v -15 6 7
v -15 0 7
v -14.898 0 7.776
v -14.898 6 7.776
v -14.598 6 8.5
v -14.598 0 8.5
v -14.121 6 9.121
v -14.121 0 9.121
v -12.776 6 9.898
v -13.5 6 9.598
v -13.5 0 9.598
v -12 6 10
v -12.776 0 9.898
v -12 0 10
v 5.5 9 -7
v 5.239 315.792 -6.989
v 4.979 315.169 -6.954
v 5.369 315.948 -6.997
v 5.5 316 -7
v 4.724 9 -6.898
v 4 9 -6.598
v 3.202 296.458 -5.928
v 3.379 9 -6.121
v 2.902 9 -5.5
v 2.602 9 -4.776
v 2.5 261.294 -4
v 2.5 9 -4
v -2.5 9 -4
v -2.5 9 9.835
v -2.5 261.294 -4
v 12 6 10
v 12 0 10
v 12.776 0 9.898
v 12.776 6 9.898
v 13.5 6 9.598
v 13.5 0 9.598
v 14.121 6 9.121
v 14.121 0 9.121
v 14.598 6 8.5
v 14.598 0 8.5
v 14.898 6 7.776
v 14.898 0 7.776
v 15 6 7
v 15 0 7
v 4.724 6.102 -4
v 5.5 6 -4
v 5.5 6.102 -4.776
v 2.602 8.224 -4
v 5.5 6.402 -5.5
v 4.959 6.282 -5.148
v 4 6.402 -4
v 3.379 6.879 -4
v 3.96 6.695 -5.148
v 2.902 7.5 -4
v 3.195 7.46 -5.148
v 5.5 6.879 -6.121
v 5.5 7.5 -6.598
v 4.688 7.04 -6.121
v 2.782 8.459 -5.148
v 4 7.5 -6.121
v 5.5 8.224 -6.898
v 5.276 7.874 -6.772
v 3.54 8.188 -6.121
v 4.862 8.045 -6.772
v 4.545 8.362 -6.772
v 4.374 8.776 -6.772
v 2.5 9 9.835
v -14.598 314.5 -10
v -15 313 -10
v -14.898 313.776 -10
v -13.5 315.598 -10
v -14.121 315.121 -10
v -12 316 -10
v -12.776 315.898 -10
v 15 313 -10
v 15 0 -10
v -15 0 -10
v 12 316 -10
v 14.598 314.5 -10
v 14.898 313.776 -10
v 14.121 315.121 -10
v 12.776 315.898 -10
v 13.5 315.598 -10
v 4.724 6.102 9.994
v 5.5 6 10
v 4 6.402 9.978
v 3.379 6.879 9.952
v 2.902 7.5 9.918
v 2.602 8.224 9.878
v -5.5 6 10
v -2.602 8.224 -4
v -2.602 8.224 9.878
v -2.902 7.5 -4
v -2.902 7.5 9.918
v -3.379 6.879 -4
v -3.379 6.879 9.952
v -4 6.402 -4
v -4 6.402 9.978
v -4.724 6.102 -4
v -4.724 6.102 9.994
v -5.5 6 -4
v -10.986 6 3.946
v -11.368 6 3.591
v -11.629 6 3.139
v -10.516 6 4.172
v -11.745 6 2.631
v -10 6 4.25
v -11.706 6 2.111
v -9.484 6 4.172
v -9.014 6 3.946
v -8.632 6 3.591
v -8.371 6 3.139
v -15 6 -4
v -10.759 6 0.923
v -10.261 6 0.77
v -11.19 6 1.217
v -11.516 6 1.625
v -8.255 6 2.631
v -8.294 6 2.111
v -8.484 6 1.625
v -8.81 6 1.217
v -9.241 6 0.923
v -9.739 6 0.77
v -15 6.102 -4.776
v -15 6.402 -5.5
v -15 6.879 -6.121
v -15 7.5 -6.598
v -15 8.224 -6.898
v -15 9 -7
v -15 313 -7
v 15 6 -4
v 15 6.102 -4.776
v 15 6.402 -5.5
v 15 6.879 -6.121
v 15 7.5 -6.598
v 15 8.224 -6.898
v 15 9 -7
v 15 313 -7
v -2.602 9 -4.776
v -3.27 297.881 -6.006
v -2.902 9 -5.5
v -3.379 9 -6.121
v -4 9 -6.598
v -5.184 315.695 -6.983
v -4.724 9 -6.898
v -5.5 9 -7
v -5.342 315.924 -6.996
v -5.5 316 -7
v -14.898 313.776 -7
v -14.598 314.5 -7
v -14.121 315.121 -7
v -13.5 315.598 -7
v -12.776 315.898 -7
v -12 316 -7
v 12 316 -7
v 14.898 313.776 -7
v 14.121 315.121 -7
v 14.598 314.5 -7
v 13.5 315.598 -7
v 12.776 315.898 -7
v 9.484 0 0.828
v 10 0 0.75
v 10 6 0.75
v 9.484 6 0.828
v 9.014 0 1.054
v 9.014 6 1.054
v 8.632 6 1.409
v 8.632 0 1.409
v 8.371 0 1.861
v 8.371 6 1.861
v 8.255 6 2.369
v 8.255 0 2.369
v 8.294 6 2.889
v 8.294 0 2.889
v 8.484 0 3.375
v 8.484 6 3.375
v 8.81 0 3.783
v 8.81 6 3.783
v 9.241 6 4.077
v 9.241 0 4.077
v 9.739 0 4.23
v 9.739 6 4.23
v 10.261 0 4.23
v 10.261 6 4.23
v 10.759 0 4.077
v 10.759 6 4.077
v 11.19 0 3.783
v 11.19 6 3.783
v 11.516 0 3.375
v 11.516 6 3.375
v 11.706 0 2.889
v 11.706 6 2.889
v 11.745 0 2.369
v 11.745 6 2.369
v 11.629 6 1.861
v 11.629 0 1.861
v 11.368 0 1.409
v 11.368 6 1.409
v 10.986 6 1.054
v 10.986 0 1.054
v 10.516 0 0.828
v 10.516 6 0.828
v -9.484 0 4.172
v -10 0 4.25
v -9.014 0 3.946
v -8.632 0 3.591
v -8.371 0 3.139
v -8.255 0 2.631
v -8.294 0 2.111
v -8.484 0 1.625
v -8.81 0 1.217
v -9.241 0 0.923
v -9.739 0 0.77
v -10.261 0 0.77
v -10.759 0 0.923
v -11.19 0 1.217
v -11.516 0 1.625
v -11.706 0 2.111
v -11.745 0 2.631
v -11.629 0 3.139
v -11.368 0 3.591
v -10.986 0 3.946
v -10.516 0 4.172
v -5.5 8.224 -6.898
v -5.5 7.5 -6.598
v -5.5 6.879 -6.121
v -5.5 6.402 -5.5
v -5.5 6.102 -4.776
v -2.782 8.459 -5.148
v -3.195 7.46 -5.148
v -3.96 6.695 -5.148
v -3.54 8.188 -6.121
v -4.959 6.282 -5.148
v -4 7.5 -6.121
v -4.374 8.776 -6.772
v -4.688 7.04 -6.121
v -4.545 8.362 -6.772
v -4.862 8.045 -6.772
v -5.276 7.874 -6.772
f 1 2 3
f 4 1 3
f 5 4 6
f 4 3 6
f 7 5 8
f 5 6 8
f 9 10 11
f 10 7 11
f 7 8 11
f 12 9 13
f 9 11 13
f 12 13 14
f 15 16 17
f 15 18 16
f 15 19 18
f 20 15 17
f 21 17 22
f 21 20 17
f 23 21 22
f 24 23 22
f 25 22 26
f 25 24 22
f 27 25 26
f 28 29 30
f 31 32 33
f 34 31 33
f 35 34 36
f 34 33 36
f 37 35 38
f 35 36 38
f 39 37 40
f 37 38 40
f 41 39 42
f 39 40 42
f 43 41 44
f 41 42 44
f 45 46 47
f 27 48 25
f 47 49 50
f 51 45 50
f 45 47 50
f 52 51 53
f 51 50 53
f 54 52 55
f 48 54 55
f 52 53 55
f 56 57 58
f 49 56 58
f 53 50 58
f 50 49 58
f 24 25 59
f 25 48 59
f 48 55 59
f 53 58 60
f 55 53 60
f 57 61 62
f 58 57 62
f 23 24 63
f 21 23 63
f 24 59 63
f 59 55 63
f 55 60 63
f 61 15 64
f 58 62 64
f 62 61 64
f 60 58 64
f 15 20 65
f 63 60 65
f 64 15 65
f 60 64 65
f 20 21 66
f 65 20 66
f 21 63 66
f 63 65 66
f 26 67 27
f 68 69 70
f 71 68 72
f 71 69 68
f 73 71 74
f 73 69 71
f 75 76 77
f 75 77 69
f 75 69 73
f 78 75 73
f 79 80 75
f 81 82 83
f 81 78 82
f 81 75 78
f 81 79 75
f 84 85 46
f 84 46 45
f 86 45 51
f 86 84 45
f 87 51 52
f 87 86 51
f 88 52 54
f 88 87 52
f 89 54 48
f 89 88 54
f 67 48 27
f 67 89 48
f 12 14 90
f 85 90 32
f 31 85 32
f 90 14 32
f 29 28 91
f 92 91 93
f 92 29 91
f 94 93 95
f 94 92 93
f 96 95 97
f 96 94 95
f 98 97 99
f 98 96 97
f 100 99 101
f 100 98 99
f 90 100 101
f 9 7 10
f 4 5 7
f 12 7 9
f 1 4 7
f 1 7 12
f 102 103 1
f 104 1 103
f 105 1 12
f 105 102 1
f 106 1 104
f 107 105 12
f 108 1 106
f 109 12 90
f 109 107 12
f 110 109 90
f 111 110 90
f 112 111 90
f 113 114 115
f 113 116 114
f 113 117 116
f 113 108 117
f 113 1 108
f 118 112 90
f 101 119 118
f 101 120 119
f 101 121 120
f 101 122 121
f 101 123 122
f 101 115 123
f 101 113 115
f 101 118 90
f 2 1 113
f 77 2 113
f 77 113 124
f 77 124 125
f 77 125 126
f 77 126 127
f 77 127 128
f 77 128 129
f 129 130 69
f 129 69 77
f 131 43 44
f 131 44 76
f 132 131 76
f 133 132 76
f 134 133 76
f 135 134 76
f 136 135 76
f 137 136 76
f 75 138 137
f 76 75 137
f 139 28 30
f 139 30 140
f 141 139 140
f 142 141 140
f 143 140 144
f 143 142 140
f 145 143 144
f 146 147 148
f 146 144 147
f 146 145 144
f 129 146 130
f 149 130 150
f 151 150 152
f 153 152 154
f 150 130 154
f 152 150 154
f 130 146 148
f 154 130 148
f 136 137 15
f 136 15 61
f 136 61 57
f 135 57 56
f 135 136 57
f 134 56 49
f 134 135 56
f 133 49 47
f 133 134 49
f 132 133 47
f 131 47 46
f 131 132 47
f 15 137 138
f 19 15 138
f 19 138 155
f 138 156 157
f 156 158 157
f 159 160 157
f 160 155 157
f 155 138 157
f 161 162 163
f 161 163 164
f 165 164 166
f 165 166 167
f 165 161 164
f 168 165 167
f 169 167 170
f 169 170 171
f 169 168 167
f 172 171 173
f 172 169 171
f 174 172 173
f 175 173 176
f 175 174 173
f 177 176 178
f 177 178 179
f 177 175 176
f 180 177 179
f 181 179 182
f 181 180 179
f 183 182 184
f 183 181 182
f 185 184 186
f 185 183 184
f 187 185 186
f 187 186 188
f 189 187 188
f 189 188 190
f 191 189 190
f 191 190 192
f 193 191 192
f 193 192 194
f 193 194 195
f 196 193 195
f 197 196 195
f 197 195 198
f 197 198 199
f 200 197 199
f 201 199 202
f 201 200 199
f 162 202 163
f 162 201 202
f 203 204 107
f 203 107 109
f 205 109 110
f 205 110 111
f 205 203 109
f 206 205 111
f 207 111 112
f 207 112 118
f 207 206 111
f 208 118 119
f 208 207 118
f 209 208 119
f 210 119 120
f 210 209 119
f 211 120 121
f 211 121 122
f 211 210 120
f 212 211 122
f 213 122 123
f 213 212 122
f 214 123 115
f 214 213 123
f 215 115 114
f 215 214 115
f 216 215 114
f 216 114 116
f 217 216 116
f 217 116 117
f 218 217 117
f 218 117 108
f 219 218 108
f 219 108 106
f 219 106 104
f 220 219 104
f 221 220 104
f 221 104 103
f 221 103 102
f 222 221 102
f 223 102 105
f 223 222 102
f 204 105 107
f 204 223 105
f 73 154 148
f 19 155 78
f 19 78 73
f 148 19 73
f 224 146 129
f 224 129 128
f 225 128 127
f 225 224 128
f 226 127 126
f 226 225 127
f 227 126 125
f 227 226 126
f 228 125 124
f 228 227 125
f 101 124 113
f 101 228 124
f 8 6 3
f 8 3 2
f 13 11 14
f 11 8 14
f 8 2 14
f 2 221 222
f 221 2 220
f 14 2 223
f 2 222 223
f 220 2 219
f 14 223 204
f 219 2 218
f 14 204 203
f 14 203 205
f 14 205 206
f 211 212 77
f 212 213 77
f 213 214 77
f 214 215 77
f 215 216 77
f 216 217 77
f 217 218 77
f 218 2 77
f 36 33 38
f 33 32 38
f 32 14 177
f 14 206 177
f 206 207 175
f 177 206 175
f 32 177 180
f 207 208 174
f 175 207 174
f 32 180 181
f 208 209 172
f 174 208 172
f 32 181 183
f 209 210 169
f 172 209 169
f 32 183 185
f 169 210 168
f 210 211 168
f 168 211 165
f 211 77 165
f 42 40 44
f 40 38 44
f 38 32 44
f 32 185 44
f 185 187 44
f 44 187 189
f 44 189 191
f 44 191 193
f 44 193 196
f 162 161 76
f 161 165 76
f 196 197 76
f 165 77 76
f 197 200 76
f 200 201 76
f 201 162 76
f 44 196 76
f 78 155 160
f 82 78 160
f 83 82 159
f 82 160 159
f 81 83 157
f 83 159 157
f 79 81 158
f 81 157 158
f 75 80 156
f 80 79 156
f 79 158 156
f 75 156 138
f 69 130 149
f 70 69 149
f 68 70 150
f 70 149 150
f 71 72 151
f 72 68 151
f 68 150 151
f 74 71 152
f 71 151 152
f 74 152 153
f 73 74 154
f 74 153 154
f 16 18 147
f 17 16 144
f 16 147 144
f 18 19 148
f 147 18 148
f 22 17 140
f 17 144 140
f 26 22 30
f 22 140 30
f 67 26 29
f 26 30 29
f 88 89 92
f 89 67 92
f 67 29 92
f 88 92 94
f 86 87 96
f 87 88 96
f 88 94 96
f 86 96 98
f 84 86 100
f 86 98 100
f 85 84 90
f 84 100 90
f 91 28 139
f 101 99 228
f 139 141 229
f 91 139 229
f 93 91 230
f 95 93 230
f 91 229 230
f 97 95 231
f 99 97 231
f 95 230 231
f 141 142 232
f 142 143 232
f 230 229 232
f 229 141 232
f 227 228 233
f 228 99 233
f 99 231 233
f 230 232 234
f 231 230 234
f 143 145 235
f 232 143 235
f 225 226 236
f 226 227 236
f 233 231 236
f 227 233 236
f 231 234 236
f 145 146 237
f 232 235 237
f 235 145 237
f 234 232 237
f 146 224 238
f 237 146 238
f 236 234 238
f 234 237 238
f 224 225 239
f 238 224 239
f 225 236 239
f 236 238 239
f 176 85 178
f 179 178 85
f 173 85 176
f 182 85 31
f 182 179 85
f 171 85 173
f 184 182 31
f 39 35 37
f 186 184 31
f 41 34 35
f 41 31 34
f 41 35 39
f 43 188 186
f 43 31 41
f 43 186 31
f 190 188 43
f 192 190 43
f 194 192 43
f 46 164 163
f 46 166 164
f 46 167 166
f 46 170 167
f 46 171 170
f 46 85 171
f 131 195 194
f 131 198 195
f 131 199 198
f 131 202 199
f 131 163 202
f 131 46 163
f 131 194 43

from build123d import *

# Parameters (mm, degrees)
SKETCH_1_W      = 30
SKETCH_1_H      = 20
SKETCH_1_R      = 1.75
EXTRUDE_1_DEPTH = 6
SKETCH_2_W      = 3
SKETCH_2_H      = 310
EXTRUDE_2_DEPTH = 30
EXTRUDE_3_DEPTH = 2.5
FILLET_1_R      = 3


with BuildPart() as part:
    # 草图1 → 凸台-拉伸1 (new body)
    with BuildSketch(Plane(origin=(0, 0, 0), x_dir=(1, 0, 0), z_dir=(0, 1, 0))):
        Rectangle(SKETCH_1_W, SKETCH_1_H)
        with Locations(Location((-10, -2.5, 0), (0, 0, 270))):
            Circle(SKETCH_1_R, mode=Mode.SUBTRACT)
        with Locations(Location((10, -2.5, 0), (0, 0, 90))):
            Circle(SKETCH_1_R, mode=Mode.SUBTRACT)
    extrude(amount=EXTRUDE_1_DEPTH)

    # 草图2 → 凸台-拉伸2 (add)
    with BuildSketch(Plane(origin=(15, 0, 0), x_dir=(0, 0, -1), z_dir=(1, 0, 0))):
        with Locations((8.5, 161)):
            Rectangle(SKETCH_2_W, SKETCH_2_H)
    extrude(amount=-EXTRUDE_2_DEPTH)

    # 草图3 → 凸台-拉伸3 (add, symmetric)
    with BuildSketch(Plane(origin=(0, 0, 0), x_dir=(0, 0, -1), z_dir=(1, 0, 0))):
        Polygon((7, 316), (-10, 6), (7, 6), align=None)
    extrude(amount=EXTRUDE_3_DEPTH, both=True)

    # 圆角1
    # the kernel refuses this fillet: 3 mm, written as the material it adds along each edge
    with BuildSketch(Plane(origin=(-5.5, 9, -4), x_dir=(0, -1, 0), z_dir=(0, 0, -1))) as fillet_1_piece_1_section:
        Polygon((0, 0), (FILLET_1_R, 0), (FILLET_1_R, -FILLET_1_R), (0, -FILLET_1_R), align=None)
    fillet_1_piece_1 = extrude(amount=FILLET_1_R, mode=Mode.PRIVATE)
    fillet_1_piece_1 = fillet_1_piece_1 - Plane(origin=(-5.5, 9, -4), x_dir=(-0.7071067811865475, 0.7071067811865475, 0), z_dir=(0, 0, -1)) * Sphere(FILLET_1_R, mode=Mode.PRIVATE)
    add(fillet_1_piece_1)
    with BuildSketch(Plane(origin=(5.5, 9, -4), x_dir=(0, -1, 0), z_dir=(0, 0, -1))) as fillet_1_piece_2_section:
        Polygon((0, 0), (FILLET_1_R, 0), (FILLET_1_R, FILLET_1_R), (0, FILLET_1_R), align=None)
    fillet_1_piece_2 = extrude(amount=FILLET_1_R, mode=Mode.PRIVATE)
    fillet_1_piece_2 = fillet_1_piece_2 - Plane(origin=(5.5, 9, -4), x_dir=(0.7071067811865475, 0.7071067811865475, 0), z_dir=(0, 0, -1)) * Sphere(FILLET_1_R, mode=Mode.PRIVATE)
    add(fillet_1_piece_2)
    with BuildSketch(Plane(origin=(-5.5, 6, -7), x_dir=(0, 0, 1), z_dir=(-1, 0, 0)), Plane(origin=(15, 6, -7), x_dir=(0, 0, 1), z_dir=(-1, 0, 0))) as fillet_1_piece_3:
        with BuildLine():
            CenterArc((FILLET_1_R, FILLET_1_R), FILLET_1_R, 180, 90)
            Line((0, FILLET_1_R), (0, 0))
            Line((0, 0), (FILLET_1_R, 0))
        make_face()
    extrude(amount=9.5)
    with BuildSketch(Plane(origin=(-2.5, 9, -7), x_dir=(-1, 0, 0), z_dir=(0, 1, 0))) as fillet_1_piece_4_section:
        with BuildLine():
            CenterArc((FILLET_1_R, FILLET_1_R), FILLET_1_R, 180, 90)
            Line((0, FILLET_1_R), (0, 0))
            Line((0, 0), (FILLET_1_R, 0))
        make_face()
    fillet_1_piece_4 = extrude(amount=307, mode=Mode.PRIVATE)
    fillet_1_piece_4 = split(fillet_1_piece_4, bisect_by=Plane(origin=(-3.194365112, 156.962181191, 1.721428773), z_dir=(0, -0.054756437403794746, -0.9984997408927277)), keep=Keep.TOP, mode=Mode.PRIVATE)
    add(fillet_1_piece_4)
    with BuildSketch(Plane(origin=(-2.5, 6, 10), x_dir=(-1, 0, 0), z_dir=(0, 0, -1))) as fillet_1_piece_5_section:
        with BuildLine():
            CenterArc((FILLET_1_R, FILLET_1_R), FILLET_1_R, 180, 90)
            Line((0, FILLET_1_R), (0, 0))
            Line((0, 0), (FILLET_1_R, 0))
        make_face()
    fillet_1_piece_5 = extrude(amount=14, mode=Mode.PRIVATE)
    fillet_1_piece_5 = split(fillet_1_piece_5, bisect_by=Plane(origin=(-3.180148424, 7.059257164, 9.941911704), z_dir=(0, -0.054756437403794746, -0.9984997408927277)), keep=Keep.TOP, mode=Mode.PRIVATE)
    add(fillet_1_piece_5)
    with BuildSketch(Plane(origin=(2.5, 9, -7), x_dir=(1, 0, 0), z_dir=(0, 1, 0))) as fillet_1_piece_6_section:
        with BuildLine():
            CenterArc((FILLET_1_R, -FILLET_1_R), FILLET_1_R, 90, 90)
            Line((0, -FILLET_1_R), (0, 0))
            Line((0, 0), (FILLET_1_R, 0))
        make_face()
    fillet_1_piece_6 = extrude(amount=307, mode=Mode.PRIVATE)
    fillet_1_piece_6 = split(fillet_1_piece_6, bisect_by=Plane(origin=(3.194365112, 156.962181191, 1.721428773), z_dir=(0, -0.054756437403794746, -0.9984997408927277)), keep=Keep.TOP, mode=Mode.PRIVATE)
    add(fillet_1_piece_6)
    with BuildSketch(Plane(origin=(2.5, 6, 10), x_dir=(1, 0, 0), z_dir=(0, 0, -1))) as fillet_1_piece_7_section:
        with BuildLine():
            CenterArc((FILLET_1_R, -FILLET_1_R), FILLET_1_R, 90, 90)
            Line((0, -FILLET_1_R), (0, 0))
            Line((0, 0), (FILLET_1_R, 0))
        make_face()
    fillet_1_piece_7 = extrude(amount=14, mode=Mode.PRIVATE)
    fillet_1_piece_7 = split(fillet_1_piece_7, bisect_by=Plane(origin=(3.180148424, 7.059257164, 9.941911704), z_dir=(0, -0.054756437403794746, -0.9984997408927277)), keep=Keep.TOP, mode=Mode.PRIVATE)
    add(fillet_1_piece_7)
    # the kernel refuses this fillet: 3 mm, written as the material it takes off along each edge
    with BuildSketch(Plane(origin=(-15, 316, 0.5), x_dir=(1, 0, 0), z_dir=(0, 0, -1))) as fillet_1_2_piece_1:
        with BuildLine():
            CenterArc((FILLET_1_R, FILLET_1_R), FILLET_1_R, 180, 90)
            Line((0, FILLET_1_R), (0, 0))
            Line((0, 0), (FILLET_1_R, 0))
        make_face()
    extrude(amount=18, mode=Mode.SUBTRACT)
    with BuildSketch(Plane(origin=(15, 316, 0.5), x_dir=(-1, 0, 0), z_dir=(0, 0, -1))) as fillet_1_2_piece_2:
        with BuildLine():
            CenterArc((FILLET_1_R, -FILLET_1_R), FILLET_1_R, 90, 90)
            Line((0, -FILLET_1_R), (0, 0))
            Line((0, 0), (FILLET_1_R, 0))
        make_face()
    extrude(amount=18, mode=Mode.SUBTRACT)
    with BuildSketch(Plane(origin=(15, -7.5, 10), x_dir=(-1, 0, 0), z_dir=(0, 1, 0))) as fillet_1_2_piece_3:
        with BuildLine():
            CenterArc((FILLET_1_R, -FILLET_1_R), FILLET_1_R, 90, 90)
            Line((0, -FILLET_1_R), (0, 0))
            Line((0, 0), (FILLET_1_R, 0))
        make_face()
    extrude(amount=21, mode=Mode.SUBTRACT)
    with BuildSketch(Plane(origin=(-15, -7.5, 10), x_dir=(1, 0, 0), z_dir=(0, 1, 0))) as fillet_1_2_piece_4:
        with BuildLine():
            CenterArc((FILLET_1_R, FILLET_1_R), FILLET_1_R, 180, 90)
            Line((0, FILLET_1_R), (0, 0))
            Line((0, 0), (FILLET_1_R, 0))
        make_face()
    extrude(amount=21, mode=Mode.SUBTRACT)


solid = part.part
